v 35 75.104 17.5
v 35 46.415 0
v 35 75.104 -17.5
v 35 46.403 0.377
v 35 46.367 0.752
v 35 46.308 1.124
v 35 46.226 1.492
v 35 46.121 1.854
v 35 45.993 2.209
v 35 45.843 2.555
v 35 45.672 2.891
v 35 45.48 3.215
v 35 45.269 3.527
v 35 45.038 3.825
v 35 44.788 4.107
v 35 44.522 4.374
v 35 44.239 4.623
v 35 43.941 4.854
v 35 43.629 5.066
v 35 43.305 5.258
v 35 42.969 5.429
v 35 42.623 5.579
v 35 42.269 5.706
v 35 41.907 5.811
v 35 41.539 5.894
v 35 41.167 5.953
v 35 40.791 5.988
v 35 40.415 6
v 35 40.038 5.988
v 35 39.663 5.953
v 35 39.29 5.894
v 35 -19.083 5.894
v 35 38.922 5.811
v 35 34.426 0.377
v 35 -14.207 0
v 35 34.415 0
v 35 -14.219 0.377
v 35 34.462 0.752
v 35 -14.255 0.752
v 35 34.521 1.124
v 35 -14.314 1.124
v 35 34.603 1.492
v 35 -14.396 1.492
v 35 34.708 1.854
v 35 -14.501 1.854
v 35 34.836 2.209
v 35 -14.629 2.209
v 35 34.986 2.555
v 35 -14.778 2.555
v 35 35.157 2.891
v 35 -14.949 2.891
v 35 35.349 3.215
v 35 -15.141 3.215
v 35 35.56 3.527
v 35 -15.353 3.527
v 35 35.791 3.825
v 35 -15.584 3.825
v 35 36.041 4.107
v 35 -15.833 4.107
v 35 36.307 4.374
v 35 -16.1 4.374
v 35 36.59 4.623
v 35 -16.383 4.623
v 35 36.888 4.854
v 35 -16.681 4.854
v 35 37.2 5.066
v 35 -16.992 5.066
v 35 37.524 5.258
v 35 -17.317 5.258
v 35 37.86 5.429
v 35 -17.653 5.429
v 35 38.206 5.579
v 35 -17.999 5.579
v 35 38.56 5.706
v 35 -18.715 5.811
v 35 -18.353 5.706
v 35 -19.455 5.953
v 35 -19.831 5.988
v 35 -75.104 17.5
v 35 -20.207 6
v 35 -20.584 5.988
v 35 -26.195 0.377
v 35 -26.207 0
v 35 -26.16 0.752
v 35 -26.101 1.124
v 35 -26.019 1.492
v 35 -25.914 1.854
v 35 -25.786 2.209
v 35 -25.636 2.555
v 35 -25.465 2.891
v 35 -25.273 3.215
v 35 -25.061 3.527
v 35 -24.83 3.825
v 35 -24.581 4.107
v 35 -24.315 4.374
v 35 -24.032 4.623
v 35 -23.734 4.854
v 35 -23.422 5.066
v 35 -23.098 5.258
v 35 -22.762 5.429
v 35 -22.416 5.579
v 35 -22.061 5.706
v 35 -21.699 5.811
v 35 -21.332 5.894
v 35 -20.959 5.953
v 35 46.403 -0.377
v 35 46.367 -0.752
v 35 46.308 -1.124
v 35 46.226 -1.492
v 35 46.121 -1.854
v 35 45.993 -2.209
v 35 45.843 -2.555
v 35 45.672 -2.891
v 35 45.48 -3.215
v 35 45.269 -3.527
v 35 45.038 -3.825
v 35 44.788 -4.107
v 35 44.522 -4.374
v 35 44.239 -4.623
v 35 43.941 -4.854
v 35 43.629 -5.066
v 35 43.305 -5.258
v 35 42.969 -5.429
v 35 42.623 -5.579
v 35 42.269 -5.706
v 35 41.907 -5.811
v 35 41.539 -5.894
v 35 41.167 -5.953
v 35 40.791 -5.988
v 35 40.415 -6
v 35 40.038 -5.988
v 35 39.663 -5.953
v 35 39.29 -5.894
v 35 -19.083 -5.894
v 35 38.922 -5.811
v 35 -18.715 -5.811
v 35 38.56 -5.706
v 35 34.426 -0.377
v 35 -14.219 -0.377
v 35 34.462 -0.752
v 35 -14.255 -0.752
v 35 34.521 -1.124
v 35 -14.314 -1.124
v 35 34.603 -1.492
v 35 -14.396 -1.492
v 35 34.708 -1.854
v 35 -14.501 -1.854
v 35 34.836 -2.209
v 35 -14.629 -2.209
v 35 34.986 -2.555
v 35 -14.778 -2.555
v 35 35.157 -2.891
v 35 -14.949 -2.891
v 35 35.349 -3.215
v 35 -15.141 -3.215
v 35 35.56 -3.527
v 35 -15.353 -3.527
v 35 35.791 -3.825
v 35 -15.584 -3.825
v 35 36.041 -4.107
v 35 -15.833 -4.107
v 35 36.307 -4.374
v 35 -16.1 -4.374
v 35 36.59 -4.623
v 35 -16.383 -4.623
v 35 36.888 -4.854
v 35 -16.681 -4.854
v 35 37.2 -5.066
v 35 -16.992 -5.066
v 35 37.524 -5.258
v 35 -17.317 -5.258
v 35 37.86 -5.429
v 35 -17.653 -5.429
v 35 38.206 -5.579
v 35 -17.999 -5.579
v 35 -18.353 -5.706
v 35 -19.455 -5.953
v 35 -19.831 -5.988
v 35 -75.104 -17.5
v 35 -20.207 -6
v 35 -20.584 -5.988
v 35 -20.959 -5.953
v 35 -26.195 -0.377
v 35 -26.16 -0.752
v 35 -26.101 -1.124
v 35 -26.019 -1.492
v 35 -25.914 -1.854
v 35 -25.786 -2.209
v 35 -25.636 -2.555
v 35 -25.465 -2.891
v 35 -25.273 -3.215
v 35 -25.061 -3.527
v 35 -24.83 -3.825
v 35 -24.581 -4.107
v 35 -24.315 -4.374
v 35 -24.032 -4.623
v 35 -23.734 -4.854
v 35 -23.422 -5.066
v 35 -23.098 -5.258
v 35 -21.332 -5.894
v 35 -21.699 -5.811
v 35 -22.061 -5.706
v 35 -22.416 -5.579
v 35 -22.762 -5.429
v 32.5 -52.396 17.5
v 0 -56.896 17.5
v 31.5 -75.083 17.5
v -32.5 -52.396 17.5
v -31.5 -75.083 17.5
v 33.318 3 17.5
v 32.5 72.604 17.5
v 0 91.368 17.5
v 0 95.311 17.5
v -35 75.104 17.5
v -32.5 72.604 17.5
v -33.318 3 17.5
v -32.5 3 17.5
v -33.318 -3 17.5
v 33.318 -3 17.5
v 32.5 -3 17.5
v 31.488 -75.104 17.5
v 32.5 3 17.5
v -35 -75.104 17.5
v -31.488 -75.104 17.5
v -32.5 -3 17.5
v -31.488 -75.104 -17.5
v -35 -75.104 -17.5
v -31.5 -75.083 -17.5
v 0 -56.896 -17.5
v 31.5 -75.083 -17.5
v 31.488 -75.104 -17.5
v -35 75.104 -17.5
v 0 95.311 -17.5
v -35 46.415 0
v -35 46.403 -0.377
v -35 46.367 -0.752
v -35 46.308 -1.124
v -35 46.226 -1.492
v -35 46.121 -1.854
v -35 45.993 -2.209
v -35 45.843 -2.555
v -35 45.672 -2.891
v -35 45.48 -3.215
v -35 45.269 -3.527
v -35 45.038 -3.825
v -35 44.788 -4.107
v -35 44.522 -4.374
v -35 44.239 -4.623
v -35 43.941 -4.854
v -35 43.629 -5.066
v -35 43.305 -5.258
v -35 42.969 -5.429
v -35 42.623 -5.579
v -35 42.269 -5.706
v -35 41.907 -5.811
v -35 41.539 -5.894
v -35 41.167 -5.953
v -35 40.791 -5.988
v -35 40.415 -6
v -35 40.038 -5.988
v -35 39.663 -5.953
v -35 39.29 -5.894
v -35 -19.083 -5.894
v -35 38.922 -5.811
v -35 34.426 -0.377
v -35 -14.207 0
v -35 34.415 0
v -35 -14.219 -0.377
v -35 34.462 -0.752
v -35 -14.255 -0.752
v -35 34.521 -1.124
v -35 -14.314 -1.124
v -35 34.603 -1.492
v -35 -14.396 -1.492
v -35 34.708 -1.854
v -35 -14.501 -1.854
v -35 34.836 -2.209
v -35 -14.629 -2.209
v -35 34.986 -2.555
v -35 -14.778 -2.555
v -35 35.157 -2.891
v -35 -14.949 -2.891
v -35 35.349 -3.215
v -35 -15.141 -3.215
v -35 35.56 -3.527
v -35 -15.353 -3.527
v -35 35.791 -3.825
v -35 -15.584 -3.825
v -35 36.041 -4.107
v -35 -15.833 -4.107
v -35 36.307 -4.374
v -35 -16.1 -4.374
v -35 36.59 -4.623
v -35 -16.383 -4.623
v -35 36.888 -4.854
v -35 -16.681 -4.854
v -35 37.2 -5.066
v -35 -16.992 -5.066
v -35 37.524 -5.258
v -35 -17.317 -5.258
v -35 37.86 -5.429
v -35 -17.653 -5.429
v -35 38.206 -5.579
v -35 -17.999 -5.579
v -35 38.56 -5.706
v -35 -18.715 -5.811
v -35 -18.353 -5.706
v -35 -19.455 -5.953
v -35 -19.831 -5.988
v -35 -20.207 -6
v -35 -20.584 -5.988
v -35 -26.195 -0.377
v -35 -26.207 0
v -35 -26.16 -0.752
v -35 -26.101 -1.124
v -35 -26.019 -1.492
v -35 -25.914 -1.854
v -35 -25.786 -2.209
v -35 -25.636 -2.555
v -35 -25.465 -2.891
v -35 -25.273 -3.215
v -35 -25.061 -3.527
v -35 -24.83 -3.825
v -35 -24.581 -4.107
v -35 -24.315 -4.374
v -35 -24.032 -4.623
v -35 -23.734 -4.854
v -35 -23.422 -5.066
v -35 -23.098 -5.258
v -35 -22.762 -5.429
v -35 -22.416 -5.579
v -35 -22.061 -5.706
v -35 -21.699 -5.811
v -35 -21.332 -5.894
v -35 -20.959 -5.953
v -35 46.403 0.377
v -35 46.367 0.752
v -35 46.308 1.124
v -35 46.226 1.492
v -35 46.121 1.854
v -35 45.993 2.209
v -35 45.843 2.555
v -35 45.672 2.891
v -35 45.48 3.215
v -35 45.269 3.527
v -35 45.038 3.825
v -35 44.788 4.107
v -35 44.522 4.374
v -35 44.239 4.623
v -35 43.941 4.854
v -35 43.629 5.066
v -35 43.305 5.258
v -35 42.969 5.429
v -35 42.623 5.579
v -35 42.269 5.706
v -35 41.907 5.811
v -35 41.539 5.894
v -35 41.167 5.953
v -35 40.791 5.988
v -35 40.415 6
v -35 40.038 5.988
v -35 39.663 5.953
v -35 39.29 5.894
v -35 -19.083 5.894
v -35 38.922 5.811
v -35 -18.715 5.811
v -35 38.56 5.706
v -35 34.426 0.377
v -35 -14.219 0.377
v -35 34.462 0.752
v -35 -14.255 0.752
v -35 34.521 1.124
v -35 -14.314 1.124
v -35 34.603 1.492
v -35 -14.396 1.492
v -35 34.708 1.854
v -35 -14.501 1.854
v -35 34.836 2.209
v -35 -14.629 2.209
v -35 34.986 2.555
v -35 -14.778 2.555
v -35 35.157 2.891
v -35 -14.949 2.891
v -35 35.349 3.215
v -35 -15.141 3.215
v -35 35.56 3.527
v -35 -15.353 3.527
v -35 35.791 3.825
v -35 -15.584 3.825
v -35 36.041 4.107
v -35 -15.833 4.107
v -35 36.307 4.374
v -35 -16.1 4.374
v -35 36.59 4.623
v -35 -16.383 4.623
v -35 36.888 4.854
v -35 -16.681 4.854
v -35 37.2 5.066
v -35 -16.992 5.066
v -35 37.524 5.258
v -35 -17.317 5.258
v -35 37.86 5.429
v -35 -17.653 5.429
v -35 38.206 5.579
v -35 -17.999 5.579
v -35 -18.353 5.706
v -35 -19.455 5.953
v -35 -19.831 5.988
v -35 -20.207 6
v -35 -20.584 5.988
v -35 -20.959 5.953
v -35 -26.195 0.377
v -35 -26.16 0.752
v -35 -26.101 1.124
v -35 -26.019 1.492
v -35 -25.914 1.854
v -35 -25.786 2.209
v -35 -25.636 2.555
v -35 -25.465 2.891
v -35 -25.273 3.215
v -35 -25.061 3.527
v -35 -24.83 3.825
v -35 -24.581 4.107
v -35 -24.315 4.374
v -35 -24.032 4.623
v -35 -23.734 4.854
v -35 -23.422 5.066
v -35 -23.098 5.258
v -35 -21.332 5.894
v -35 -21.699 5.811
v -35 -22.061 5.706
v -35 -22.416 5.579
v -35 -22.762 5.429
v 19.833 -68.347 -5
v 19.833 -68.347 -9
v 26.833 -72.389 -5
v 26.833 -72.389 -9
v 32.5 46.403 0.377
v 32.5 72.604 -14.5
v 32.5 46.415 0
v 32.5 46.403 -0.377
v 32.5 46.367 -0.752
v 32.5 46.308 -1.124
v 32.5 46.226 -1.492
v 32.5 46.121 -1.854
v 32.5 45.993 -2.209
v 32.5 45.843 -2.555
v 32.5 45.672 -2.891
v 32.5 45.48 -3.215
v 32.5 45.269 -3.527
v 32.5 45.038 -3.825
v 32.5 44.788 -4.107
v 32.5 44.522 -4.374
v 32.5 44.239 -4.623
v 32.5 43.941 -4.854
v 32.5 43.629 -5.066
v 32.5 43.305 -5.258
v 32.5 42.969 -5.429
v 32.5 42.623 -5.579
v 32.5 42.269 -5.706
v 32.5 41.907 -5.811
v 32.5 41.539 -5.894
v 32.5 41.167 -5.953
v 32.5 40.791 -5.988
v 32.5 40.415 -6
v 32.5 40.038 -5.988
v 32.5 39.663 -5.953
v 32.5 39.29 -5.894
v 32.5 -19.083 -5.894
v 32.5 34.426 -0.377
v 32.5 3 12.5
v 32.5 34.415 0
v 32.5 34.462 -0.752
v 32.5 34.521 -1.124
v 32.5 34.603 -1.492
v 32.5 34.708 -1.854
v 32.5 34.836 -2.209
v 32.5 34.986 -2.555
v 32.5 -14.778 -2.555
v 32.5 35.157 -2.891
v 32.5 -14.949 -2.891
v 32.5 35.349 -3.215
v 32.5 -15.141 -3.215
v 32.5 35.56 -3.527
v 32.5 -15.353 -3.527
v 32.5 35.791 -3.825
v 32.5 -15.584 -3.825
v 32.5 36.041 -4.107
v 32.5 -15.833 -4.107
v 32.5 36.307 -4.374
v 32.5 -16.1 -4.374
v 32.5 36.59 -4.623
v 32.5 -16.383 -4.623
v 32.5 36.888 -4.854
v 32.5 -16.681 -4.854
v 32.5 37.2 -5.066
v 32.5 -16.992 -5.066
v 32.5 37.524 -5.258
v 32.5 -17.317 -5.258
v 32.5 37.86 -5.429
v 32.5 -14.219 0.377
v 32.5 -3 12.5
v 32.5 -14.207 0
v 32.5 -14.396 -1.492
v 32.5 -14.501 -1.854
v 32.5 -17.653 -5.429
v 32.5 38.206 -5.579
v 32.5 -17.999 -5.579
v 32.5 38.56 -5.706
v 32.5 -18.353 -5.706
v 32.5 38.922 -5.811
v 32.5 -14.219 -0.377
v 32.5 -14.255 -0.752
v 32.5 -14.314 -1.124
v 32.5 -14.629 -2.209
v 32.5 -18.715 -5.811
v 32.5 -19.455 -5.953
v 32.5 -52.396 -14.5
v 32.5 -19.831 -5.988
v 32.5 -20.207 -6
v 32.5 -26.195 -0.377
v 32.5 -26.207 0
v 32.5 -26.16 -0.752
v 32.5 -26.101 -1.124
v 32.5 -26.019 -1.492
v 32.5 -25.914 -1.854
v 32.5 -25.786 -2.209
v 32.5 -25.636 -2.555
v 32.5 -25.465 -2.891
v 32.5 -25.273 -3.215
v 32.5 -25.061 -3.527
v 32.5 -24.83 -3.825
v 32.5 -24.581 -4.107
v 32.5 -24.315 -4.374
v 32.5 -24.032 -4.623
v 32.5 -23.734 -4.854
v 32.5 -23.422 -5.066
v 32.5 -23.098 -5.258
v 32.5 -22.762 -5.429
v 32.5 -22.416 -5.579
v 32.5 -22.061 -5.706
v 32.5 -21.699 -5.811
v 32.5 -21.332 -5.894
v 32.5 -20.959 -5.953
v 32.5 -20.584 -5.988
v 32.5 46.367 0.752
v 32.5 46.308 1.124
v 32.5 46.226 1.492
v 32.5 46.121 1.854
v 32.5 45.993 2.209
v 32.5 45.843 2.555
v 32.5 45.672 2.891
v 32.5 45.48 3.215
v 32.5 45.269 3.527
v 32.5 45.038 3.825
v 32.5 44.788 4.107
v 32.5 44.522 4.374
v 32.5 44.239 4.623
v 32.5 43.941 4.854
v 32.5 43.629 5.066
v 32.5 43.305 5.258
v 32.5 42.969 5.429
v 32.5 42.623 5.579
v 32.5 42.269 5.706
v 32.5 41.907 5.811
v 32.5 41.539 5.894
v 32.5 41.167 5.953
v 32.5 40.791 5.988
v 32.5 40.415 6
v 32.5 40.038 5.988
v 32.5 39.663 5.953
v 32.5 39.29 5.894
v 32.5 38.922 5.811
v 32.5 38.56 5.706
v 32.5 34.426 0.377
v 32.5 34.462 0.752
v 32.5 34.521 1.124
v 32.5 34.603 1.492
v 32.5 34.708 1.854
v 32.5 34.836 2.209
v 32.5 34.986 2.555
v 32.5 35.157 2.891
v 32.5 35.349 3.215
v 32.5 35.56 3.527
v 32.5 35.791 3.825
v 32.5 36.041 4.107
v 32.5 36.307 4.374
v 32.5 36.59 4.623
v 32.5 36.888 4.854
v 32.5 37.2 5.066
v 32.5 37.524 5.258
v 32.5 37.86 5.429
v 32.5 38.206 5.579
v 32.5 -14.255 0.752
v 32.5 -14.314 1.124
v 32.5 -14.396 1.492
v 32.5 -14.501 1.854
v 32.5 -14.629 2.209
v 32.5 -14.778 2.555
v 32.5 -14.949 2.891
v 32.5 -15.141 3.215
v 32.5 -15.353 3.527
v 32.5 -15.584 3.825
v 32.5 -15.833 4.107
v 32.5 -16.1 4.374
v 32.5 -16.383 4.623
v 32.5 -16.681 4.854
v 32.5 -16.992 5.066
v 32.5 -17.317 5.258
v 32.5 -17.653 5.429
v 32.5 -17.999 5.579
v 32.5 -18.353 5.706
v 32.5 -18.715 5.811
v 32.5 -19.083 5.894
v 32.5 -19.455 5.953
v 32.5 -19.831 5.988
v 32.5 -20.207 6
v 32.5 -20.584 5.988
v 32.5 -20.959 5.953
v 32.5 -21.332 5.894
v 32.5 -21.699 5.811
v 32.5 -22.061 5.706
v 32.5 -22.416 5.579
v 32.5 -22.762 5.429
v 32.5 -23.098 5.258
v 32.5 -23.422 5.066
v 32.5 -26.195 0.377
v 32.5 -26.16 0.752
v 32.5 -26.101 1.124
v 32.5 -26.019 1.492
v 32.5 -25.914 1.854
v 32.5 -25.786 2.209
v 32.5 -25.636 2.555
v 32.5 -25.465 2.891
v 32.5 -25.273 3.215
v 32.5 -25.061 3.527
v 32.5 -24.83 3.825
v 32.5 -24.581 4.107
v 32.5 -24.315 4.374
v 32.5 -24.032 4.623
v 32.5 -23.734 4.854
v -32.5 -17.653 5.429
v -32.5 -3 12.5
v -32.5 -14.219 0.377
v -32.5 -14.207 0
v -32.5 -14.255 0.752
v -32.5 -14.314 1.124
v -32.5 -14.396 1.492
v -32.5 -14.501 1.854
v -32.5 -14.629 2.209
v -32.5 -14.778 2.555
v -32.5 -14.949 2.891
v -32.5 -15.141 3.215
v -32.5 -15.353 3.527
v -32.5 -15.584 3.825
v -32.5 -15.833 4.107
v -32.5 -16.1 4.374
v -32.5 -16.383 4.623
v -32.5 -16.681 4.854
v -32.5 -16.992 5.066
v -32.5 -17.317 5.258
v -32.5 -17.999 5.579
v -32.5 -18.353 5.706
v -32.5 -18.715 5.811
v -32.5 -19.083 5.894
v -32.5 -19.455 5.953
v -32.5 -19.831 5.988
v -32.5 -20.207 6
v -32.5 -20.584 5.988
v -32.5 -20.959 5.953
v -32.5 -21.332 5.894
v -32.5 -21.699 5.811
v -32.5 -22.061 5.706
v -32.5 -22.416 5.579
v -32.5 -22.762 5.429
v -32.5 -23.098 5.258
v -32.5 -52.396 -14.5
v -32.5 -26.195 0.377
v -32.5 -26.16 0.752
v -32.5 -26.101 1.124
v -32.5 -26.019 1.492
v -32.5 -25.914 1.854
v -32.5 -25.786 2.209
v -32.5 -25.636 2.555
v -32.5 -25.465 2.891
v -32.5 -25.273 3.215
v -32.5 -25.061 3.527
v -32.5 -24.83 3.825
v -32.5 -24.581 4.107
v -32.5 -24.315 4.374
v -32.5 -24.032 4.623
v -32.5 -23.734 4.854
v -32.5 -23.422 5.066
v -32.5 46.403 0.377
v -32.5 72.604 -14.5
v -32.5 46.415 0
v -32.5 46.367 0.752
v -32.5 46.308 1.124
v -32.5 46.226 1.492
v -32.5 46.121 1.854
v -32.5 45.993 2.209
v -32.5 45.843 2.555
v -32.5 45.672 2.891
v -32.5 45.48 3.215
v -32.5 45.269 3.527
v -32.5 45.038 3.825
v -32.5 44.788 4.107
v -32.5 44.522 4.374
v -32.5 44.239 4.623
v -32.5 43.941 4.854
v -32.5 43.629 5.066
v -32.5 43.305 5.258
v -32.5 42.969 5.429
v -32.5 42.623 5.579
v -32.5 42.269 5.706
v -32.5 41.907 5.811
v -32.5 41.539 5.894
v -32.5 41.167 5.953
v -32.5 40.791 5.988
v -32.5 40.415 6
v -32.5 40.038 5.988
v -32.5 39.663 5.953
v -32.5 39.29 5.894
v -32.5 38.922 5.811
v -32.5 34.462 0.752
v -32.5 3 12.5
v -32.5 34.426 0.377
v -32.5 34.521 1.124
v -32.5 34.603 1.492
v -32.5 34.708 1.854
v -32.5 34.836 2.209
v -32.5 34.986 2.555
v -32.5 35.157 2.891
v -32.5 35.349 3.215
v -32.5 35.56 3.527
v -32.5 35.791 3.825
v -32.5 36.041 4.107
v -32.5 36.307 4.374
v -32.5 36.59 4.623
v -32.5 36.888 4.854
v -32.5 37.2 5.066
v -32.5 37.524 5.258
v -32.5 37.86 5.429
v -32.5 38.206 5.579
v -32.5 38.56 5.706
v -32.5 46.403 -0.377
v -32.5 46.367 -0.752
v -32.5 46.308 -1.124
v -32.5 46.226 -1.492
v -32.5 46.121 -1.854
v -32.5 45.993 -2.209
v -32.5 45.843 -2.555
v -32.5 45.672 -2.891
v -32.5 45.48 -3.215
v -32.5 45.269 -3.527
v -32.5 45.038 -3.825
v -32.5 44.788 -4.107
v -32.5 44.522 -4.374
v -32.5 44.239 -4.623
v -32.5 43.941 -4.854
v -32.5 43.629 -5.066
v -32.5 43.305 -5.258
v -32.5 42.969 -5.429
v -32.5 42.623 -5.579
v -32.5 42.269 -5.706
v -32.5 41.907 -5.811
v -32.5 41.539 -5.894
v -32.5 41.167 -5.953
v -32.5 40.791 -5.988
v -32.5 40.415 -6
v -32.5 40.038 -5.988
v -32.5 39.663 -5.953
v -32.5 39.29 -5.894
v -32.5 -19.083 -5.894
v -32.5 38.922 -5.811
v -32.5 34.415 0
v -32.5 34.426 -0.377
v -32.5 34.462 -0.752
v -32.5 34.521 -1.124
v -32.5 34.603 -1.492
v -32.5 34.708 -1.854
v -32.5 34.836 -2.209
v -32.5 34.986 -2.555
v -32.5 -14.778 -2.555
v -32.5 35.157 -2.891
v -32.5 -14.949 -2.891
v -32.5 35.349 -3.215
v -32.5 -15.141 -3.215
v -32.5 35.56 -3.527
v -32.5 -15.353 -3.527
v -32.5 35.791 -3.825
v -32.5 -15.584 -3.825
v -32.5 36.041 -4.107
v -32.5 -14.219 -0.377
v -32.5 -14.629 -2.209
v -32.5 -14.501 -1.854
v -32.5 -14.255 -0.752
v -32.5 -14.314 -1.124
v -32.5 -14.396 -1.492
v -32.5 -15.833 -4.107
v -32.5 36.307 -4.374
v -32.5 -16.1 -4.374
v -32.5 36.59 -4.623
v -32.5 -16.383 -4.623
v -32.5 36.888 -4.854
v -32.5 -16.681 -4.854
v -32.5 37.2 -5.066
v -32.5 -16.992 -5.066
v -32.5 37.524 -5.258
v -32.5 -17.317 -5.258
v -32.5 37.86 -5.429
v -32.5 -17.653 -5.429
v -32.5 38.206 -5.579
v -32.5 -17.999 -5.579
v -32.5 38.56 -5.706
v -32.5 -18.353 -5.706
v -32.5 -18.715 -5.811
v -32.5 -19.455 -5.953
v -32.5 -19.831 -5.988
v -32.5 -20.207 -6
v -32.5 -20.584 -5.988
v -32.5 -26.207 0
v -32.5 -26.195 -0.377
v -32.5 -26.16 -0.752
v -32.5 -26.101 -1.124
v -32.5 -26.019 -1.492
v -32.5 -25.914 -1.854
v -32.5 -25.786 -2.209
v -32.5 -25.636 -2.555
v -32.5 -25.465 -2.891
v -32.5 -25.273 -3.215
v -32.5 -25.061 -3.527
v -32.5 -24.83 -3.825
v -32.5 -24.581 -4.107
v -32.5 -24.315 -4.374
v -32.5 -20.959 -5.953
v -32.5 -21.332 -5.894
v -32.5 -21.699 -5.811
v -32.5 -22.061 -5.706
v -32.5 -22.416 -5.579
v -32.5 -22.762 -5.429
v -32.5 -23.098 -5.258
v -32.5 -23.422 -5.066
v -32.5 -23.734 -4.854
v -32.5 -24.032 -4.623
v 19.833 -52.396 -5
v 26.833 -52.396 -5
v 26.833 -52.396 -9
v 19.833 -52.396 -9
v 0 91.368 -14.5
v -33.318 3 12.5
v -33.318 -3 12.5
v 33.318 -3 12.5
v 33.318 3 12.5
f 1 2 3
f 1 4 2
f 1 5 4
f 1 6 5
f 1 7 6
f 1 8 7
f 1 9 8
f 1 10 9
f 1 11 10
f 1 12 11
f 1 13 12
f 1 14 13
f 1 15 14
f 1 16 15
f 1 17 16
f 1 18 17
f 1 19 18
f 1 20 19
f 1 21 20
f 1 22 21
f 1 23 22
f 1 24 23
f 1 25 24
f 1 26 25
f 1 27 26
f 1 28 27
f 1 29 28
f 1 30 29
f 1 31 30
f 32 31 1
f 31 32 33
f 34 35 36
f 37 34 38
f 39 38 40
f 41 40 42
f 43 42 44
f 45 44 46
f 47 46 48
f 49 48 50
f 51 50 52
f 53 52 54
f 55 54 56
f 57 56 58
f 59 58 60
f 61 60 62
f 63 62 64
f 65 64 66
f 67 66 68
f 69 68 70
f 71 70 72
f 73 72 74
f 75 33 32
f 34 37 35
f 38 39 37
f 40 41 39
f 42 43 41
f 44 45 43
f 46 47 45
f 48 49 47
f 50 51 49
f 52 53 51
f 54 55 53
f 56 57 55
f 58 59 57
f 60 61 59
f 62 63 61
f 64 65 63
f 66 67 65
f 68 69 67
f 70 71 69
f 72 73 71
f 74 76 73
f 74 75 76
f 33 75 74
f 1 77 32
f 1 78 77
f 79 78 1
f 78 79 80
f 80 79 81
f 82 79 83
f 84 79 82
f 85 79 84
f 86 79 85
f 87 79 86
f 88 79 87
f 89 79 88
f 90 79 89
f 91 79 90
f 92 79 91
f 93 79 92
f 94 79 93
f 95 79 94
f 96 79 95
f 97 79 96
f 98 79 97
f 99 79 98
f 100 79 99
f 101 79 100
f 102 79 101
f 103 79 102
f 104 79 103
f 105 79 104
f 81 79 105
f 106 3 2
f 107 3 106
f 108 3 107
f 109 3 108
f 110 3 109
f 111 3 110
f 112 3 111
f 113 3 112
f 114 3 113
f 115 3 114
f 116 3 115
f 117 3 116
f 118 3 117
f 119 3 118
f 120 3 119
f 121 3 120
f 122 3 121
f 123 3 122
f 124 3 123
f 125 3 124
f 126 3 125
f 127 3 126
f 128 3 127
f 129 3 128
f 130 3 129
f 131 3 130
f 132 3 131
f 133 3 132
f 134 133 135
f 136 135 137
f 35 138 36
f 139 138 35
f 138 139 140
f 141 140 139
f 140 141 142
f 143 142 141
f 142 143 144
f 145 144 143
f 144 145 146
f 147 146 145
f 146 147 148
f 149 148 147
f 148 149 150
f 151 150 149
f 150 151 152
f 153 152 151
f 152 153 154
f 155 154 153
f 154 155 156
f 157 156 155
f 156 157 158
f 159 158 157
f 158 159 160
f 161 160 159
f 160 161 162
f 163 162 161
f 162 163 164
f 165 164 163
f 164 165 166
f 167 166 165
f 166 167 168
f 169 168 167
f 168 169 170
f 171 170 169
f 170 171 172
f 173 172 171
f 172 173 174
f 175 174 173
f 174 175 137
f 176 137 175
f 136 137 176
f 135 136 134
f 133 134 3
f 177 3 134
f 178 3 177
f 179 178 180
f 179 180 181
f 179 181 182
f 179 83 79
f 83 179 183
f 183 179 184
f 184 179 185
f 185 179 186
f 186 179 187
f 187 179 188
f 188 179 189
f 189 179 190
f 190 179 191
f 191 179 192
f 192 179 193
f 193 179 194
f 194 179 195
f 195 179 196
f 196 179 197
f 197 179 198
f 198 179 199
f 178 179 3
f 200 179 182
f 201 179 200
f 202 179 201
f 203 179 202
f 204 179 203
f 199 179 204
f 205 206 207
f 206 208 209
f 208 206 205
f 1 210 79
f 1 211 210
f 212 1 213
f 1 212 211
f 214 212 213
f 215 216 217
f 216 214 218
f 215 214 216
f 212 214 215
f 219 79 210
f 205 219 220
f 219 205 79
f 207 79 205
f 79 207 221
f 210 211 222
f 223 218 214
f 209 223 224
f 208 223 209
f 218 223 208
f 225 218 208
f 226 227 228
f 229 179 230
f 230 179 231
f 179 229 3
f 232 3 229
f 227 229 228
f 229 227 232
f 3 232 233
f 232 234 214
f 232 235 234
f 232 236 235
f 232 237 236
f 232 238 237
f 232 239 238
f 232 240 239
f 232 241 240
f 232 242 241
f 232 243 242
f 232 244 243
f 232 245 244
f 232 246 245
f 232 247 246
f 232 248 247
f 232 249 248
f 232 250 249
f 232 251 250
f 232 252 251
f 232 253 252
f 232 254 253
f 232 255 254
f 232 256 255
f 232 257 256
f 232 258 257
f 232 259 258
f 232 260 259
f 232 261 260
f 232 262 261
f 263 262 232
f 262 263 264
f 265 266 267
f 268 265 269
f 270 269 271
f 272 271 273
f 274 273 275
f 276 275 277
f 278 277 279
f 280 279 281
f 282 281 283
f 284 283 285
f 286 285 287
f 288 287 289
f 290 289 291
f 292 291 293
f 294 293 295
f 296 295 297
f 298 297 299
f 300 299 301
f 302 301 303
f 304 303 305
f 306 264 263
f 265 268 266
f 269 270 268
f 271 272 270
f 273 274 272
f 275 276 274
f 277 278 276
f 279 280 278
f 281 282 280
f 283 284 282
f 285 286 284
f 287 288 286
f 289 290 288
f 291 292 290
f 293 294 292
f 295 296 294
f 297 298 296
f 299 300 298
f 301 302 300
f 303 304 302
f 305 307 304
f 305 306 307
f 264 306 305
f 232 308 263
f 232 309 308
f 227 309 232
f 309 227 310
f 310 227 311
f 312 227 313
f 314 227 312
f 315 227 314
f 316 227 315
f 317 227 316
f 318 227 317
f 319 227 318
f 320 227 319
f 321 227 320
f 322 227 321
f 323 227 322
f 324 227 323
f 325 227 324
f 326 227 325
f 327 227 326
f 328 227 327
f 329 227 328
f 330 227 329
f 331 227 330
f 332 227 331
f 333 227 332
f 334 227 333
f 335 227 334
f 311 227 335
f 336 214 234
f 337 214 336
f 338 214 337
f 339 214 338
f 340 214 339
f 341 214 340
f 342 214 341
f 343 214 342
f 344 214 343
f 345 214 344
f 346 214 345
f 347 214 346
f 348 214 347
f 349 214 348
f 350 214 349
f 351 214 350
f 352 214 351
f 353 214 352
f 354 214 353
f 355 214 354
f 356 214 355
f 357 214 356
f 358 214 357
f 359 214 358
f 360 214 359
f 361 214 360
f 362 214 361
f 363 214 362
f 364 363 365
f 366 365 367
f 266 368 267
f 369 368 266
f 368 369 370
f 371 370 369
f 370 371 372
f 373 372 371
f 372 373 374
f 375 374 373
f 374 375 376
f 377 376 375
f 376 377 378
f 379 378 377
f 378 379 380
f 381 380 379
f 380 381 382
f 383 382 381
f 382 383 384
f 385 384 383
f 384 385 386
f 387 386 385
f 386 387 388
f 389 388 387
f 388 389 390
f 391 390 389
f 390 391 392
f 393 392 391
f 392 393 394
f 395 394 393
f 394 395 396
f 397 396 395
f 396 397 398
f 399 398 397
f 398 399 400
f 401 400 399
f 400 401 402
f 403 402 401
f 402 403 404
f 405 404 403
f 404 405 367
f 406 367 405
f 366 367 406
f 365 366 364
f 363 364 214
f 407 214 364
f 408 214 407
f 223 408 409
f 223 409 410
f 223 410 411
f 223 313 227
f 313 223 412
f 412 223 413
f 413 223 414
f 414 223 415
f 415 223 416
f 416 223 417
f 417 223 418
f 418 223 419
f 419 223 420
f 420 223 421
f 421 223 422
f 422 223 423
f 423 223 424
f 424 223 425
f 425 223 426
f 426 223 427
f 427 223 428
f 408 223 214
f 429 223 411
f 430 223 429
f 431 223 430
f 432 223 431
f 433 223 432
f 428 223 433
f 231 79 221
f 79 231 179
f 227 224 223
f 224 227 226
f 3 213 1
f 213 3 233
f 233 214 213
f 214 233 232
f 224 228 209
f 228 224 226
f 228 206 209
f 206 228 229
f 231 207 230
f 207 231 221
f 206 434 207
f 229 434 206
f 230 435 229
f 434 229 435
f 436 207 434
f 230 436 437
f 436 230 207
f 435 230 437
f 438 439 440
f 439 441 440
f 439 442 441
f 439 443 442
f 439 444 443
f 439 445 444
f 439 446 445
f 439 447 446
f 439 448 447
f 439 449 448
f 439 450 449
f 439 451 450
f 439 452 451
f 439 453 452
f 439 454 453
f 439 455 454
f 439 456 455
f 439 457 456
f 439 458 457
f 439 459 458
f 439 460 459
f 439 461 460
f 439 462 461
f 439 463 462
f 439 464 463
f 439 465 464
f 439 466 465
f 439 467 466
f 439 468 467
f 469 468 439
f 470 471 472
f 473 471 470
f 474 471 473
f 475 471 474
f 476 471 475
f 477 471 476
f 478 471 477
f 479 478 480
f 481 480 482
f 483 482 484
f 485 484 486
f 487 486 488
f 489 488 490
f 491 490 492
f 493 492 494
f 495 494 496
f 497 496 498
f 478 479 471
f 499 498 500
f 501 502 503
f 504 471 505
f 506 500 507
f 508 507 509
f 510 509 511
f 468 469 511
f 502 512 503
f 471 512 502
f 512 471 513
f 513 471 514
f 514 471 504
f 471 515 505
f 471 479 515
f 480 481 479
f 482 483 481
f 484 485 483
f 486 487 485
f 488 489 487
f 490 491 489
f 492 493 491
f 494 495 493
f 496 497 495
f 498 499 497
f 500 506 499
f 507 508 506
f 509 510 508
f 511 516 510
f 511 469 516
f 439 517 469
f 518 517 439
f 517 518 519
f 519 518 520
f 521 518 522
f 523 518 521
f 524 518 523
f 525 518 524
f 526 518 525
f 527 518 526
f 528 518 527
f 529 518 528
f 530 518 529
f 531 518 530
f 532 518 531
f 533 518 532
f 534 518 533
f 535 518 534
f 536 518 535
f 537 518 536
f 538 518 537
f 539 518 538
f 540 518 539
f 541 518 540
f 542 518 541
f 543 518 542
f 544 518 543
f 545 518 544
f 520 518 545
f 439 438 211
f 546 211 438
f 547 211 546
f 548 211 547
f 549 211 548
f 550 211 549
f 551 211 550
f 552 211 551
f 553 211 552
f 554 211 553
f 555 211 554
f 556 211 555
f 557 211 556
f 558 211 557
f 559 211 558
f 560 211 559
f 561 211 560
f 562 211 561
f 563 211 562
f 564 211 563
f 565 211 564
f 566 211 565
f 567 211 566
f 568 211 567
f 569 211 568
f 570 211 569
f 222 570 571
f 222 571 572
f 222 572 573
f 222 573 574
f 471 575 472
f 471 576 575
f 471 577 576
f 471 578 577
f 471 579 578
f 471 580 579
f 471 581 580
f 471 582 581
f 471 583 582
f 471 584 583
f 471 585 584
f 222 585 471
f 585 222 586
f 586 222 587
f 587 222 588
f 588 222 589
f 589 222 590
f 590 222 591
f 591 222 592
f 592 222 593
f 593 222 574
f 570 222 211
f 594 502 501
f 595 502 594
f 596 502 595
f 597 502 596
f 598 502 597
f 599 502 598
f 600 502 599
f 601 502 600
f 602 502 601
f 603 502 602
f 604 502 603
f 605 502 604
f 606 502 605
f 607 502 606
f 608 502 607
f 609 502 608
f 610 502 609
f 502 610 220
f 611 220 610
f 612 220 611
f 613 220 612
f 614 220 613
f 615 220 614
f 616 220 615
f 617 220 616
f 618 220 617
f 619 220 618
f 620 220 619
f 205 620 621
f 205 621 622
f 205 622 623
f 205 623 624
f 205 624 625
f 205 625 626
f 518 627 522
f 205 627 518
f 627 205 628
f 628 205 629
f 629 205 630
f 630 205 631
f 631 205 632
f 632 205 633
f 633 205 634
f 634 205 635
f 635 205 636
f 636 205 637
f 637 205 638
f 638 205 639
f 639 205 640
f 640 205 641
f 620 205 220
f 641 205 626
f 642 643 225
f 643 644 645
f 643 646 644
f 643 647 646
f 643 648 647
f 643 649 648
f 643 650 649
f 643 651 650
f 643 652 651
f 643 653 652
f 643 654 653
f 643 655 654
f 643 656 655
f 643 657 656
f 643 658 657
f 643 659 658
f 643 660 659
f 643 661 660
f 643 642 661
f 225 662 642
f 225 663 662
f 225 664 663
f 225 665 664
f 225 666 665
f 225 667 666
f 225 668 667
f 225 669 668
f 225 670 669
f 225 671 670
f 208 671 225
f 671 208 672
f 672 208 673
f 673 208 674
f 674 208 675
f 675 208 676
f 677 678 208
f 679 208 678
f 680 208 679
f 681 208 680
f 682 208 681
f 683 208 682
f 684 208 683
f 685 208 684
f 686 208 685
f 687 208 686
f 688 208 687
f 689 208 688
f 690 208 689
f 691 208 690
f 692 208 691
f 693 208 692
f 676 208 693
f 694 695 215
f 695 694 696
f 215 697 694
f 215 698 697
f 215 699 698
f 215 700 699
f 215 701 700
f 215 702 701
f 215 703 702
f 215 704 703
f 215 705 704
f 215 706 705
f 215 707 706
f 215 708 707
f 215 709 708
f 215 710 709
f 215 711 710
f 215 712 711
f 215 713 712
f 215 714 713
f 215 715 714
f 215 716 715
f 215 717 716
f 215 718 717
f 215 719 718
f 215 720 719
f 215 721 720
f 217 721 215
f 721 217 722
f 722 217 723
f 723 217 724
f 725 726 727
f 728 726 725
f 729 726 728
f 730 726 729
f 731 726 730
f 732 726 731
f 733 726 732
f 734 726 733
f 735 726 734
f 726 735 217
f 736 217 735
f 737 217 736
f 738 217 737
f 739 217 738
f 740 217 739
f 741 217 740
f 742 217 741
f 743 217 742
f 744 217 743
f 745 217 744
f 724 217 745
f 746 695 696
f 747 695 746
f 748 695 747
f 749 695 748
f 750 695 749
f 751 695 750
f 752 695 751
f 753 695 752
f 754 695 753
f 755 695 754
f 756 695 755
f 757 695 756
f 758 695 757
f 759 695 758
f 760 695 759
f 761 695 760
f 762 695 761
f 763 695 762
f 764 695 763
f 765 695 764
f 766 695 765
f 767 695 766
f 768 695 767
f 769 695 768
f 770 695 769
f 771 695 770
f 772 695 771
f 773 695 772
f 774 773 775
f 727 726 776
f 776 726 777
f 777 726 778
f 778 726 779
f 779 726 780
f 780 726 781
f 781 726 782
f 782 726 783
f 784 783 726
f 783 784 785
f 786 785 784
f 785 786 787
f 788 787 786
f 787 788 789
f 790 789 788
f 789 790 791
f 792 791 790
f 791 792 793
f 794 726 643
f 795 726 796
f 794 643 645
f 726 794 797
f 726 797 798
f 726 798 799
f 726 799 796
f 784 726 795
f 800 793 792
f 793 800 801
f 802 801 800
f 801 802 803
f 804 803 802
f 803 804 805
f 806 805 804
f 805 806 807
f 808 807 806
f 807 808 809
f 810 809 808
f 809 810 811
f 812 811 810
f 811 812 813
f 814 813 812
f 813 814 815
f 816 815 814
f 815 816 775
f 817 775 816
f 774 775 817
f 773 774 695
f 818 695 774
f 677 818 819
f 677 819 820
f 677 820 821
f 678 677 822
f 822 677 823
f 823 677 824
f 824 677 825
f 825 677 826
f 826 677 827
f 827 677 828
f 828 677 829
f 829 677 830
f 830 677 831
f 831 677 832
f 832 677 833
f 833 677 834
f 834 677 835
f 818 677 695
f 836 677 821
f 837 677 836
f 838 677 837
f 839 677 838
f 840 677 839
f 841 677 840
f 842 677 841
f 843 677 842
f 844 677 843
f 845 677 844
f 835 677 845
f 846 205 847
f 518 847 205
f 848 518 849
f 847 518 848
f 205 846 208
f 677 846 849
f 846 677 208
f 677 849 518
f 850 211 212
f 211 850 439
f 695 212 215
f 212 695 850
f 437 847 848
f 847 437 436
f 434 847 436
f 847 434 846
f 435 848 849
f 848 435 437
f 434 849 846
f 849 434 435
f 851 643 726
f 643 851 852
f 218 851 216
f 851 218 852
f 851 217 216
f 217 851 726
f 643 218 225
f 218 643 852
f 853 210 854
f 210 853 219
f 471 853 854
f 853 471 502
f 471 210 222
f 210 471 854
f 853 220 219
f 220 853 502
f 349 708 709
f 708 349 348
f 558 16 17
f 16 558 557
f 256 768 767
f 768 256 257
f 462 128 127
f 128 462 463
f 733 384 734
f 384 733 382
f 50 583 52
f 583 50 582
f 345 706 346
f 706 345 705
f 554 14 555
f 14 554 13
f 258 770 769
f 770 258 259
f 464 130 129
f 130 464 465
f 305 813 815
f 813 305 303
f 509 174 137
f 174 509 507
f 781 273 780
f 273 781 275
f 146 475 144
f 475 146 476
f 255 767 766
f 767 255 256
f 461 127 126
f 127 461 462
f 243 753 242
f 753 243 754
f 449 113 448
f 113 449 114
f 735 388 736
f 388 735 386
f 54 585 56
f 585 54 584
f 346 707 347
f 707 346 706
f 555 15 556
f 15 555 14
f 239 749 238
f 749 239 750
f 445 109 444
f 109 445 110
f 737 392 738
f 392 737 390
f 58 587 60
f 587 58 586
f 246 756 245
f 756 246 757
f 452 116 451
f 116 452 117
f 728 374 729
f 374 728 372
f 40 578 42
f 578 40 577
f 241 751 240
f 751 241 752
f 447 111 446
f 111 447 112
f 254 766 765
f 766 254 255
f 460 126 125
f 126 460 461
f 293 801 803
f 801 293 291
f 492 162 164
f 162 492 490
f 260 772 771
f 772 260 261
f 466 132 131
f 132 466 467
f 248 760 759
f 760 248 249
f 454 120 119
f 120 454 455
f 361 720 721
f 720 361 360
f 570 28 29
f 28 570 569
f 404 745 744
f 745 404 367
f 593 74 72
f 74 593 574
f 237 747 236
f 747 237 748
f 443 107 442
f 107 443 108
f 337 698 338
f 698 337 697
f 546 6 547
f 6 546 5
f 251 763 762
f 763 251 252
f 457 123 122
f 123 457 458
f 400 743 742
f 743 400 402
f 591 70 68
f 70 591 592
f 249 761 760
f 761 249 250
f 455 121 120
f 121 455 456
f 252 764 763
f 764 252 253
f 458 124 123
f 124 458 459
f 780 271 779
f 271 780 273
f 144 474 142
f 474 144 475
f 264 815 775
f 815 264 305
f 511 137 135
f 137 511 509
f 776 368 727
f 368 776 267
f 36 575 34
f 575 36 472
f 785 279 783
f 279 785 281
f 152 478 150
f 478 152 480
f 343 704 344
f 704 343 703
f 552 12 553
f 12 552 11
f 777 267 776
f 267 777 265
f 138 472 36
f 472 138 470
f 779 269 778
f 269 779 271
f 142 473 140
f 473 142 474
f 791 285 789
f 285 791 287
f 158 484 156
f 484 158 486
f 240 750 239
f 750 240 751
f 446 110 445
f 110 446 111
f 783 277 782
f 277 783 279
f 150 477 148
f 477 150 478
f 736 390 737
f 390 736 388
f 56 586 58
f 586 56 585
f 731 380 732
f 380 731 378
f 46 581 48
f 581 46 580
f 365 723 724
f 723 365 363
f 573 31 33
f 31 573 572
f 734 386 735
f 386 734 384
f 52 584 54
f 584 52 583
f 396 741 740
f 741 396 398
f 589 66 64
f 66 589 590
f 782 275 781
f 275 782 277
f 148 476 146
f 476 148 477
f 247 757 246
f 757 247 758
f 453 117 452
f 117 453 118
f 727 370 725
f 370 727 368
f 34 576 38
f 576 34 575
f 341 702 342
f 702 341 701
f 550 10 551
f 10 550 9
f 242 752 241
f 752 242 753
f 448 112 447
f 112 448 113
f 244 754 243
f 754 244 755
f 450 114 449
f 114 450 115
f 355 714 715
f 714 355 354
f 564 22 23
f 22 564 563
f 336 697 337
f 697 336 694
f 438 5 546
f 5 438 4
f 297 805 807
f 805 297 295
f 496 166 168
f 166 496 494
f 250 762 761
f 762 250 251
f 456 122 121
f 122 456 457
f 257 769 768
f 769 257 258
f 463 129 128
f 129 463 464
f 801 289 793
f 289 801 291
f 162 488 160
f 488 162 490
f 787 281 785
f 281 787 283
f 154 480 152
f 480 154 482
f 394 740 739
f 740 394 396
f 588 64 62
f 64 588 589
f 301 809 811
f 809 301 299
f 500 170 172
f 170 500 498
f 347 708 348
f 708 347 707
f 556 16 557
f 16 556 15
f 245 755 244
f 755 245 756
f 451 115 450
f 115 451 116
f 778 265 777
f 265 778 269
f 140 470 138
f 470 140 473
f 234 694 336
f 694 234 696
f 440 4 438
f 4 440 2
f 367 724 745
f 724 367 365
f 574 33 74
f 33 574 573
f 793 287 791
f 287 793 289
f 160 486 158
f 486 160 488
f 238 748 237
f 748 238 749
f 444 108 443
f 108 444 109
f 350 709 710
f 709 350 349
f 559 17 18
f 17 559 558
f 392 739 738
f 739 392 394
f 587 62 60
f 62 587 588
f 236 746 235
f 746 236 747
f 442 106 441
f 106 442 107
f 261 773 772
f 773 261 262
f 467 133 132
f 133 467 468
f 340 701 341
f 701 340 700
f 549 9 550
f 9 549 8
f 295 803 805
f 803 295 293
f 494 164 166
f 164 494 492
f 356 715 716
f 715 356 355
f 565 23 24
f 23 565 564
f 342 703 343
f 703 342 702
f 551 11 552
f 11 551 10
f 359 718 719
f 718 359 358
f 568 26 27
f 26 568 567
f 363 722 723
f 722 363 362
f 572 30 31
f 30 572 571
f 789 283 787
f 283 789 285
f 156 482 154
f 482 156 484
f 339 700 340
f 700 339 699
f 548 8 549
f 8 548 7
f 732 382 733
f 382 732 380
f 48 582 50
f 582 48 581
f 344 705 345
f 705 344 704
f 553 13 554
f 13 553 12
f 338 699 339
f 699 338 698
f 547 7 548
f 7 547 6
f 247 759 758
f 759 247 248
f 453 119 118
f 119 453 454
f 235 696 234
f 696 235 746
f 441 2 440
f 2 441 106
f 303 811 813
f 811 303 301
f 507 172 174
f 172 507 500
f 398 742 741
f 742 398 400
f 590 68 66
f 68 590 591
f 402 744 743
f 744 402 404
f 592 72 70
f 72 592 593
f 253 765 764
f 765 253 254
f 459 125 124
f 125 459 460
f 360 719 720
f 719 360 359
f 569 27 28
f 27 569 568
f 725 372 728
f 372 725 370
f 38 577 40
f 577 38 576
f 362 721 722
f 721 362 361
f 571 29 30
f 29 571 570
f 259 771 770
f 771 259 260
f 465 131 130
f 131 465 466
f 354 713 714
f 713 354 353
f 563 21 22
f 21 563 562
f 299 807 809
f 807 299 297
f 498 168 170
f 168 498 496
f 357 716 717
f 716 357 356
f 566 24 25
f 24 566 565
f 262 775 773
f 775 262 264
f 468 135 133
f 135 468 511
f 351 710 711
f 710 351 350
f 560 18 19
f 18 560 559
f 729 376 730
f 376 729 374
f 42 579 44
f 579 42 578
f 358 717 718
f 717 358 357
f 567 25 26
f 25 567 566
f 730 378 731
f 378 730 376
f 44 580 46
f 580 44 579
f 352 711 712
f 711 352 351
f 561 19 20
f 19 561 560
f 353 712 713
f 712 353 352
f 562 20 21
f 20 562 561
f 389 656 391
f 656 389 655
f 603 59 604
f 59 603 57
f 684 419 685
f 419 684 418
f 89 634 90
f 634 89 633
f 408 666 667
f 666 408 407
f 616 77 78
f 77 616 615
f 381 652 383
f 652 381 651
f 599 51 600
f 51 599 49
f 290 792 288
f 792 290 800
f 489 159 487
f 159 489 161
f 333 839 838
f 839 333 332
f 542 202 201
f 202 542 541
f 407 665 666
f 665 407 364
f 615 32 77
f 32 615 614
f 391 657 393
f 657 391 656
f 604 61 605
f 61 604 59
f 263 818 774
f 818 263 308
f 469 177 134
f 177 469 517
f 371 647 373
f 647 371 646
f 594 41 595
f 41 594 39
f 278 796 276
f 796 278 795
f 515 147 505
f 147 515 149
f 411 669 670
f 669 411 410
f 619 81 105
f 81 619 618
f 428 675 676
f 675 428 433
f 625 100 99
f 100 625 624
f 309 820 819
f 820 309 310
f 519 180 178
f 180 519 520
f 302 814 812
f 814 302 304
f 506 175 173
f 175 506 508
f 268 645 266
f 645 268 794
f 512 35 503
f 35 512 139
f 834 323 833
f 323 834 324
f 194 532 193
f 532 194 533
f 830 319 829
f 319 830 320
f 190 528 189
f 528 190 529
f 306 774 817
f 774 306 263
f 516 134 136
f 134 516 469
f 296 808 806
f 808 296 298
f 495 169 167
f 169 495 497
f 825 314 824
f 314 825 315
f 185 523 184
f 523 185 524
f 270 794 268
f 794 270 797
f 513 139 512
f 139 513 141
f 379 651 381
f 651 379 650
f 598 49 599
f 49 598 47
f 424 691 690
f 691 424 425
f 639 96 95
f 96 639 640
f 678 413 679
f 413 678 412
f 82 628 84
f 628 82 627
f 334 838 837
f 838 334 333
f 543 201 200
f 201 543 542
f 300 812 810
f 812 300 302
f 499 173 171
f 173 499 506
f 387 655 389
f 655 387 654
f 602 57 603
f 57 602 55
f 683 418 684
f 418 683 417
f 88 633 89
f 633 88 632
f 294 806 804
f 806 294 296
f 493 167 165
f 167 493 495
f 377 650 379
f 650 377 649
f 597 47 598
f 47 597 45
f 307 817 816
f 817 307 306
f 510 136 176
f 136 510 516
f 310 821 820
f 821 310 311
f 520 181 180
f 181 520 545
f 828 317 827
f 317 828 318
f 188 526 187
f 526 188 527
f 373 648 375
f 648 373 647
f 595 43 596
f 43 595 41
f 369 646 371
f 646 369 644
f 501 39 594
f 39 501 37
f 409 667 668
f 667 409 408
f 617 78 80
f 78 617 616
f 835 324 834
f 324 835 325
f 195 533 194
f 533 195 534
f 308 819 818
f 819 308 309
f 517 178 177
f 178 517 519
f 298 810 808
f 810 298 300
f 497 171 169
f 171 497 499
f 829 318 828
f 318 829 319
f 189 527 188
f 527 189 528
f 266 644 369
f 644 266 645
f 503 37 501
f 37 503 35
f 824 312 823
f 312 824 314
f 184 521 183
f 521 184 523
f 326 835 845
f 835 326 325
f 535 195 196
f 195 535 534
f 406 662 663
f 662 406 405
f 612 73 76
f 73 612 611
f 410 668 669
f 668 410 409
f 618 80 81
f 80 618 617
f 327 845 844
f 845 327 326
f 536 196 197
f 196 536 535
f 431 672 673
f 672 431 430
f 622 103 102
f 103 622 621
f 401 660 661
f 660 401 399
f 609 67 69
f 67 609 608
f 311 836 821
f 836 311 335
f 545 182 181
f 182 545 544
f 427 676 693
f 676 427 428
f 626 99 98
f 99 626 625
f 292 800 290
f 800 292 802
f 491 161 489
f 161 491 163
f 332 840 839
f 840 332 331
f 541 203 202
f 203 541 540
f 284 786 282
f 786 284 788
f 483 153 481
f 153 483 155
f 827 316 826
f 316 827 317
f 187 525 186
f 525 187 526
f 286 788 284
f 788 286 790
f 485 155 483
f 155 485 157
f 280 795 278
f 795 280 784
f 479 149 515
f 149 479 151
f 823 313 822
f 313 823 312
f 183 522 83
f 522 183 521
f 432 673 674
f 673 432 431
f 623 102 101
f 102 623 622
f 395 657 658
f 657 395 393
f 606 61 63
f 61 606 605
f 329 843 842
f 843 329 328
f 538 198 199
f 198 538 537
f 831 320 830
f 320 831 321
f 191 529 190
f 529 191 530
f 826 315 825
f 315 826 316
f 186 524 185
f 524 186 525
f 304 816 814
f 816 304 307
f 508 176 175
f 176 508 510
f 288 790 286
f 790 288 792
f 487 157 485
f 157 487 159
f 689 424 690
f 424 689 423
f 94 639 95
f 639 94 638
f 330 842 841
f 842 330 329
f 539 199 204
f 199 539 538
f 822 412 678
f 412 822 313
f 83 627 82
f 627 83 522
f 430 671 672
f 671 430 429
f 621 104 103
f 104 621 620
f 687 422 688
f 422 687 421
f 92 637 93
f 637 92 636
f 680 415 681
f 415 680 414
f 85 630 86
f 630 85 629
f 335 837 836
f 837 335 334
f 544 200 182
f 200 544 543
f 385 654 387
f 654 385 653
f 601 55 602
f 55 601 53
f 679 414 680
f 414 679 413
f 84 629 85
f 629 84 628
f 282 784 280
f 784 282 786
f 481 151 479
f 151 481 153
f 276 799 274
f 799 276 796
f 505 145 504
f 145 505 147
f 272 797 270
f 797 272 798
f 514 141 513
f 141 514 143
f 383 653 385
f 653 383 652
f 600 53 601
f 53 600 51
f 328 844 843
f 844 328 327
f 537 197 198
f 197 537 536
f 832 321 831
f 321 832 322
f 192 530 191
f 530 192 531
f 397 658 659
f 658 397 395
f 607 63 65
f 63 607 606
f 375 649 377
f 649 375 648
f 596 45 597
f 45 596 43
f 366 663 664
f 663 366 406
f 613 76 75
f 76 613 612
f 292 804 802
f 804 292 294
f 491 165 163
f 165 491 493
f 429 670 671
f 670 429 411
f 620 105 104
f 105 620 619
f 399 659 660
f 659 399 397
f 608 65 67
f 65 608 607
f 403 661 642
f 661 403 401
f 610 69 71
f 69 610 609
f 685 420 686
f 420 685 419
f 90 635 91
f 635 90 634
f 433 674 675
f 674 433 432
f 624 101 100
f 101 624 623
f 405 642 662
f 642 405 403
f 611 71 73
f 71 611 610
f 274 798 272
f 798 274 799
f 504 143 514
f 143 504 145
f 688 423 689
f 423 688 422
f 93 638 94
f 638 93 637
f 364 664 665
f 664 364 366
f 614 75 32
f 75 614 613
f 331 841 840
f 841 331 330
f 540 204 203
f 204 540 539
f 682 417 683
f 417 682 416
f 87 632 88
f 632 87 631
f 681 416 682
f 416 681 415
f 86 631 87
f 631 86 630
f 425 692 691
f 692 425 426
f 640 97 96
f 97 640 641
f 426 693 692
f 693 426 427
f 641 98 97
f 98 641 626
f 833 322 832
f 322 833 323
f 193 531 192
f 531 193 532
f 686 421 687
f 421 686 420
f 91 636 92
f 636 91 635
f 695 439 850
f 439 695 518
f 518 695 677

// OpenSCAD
$fn = 100;

// Functions for calculating the half-hexagons
function edge_length(width) = (width/2) / cos(30); // CAH
function point_height(width) = (width/2) * tan(30); // TOA
function leg(width) = edge_length(width) * sqrt(1/2);
function x_offset(width) = (width/2) - (leg(width) * cos(15));
function y_offset(width, length) = (length/2) - (leg(width) * sin(15));

//function x_offset2(width) = (width/2) + (leg(width) * sin(15));
function y_offset2(width, length) = (length/2) + (leg(width) * cos(15)) - point_height(w) + 2; // +2 is arbitrary, should fix.

// Values for wall thickness
h_pad = -1;
w_pad = 5;
l_pad = 5;

// Core size variables
scaling = 1;
lip = 0;
h = (35 + lip) * scaling;
w = (65 + w_pad) * scaling;
l = (75 + 50 + l_pad + point_height(w)) * scaling;// 86 = Pi, 50 = Dongle

btm = w*0.9;

difference(){ // Between the exterior and interior
// The exterior shape
difference(){ // For the btm (bottom) cutout
union(){
cube([w, l, h], center=true); // Center Cube

translate([x_offset(w),y_offset(w,l),0]){
	rotate([0,0,-30]) cube([edge_length(w),edge_length(w),h], center=true);
}
translate([-x_offset(w),y_offset(w,l),0]){
	rotate([0,0,30]) cube([edge_length(w),edge_length(w),h], center=true);
}}
translate([-x_offset(btm),-y_offset2(btm,l),0]){
	rotate([0,0,30]) cube([edge_length(btm),edge_length(btm),h-h_pad], center=true);
}
translate([x_offset(btm),-y_offset2(btm,l),0]){
	rotate([0,0,-30]) cube([edge_length(btm),edge_length(btm),h-h_pad], center=true);
}}

// The interior cutout
union(){
translate([0,point_height(w)/2,0]){
cube([w-w_pad, l-l_pad- point_height(w), h-h_pad], center=true); // Center Cube
}
translate([x_offset(w-w_pad),y_offset(w-w_pad,l-l_pad),0]){
	rotate([0,0,-30]) cube([edge_length(w-w_pad),edge_length(w-w_pad),h-h_pad], center=true);
}
translate([-x_offset(w-w_pad),y_offset(w-w_pad,l-l_pad),0]){
	rotate([0,0,30]) cube([edge_length(w-w_pad),edge_length(w-w_pad),h-h_pad], center=true);
}}
translate([w/3,-l/2+point_height(w),-h/5]){cube([7, 40, 4], center=true);} // Charger
translate([-w/2.2,0,h/2]){cube([3, 6, 10], center=true);} // Lid grooves
translate([w/2.2,0,h/2]){cube([3, 6, 10], center=true);}
translate([0,point_height(w)*2,0]){rotate([0,90]) cylinder(h=100, r=6, center=true);}
translate([0,-point_height(w),lip]){rotate([0,90]) cylinder(h=100, r=6, center=true);}
}


// The floor of the case
translate([0,0,-(h/2)+(h_lid/2)+lip]){
difference(){
union(){
cube([w, l, h_lid], center=true); // Center Cube

translate([x_offset(w),y_offset(w,l),0]){
	rotate([0,0,-30]) cube([edge_length(w),edge_length(w),h_lid], center=true);
}
translate([-x_offset(w),y_offset(w,l),0]){
	rotate([0,0,30]) cube([edge_length(w),edge_length(w),h_lid], center=true);
}}
translate([-x_offset(btm),-y_offset2(btm,l),0]){
	rotate([0,0,30]) cube([edge_length(btm),edge_length(btm),h_lid-h_pad], center=true);
}
translate([x_offset(btm),-y_offset2(btm,l),0]){
	rotate([0,0,-30]) cube([edge_length(btm),edge_length(btm),h_lid-h_pad], center=true);
}}}


// The lid
h_lid = 3;
function hex_len(width) = 2 * (cos(30) * width);
hex_edge = edge_length(w/1.6);
